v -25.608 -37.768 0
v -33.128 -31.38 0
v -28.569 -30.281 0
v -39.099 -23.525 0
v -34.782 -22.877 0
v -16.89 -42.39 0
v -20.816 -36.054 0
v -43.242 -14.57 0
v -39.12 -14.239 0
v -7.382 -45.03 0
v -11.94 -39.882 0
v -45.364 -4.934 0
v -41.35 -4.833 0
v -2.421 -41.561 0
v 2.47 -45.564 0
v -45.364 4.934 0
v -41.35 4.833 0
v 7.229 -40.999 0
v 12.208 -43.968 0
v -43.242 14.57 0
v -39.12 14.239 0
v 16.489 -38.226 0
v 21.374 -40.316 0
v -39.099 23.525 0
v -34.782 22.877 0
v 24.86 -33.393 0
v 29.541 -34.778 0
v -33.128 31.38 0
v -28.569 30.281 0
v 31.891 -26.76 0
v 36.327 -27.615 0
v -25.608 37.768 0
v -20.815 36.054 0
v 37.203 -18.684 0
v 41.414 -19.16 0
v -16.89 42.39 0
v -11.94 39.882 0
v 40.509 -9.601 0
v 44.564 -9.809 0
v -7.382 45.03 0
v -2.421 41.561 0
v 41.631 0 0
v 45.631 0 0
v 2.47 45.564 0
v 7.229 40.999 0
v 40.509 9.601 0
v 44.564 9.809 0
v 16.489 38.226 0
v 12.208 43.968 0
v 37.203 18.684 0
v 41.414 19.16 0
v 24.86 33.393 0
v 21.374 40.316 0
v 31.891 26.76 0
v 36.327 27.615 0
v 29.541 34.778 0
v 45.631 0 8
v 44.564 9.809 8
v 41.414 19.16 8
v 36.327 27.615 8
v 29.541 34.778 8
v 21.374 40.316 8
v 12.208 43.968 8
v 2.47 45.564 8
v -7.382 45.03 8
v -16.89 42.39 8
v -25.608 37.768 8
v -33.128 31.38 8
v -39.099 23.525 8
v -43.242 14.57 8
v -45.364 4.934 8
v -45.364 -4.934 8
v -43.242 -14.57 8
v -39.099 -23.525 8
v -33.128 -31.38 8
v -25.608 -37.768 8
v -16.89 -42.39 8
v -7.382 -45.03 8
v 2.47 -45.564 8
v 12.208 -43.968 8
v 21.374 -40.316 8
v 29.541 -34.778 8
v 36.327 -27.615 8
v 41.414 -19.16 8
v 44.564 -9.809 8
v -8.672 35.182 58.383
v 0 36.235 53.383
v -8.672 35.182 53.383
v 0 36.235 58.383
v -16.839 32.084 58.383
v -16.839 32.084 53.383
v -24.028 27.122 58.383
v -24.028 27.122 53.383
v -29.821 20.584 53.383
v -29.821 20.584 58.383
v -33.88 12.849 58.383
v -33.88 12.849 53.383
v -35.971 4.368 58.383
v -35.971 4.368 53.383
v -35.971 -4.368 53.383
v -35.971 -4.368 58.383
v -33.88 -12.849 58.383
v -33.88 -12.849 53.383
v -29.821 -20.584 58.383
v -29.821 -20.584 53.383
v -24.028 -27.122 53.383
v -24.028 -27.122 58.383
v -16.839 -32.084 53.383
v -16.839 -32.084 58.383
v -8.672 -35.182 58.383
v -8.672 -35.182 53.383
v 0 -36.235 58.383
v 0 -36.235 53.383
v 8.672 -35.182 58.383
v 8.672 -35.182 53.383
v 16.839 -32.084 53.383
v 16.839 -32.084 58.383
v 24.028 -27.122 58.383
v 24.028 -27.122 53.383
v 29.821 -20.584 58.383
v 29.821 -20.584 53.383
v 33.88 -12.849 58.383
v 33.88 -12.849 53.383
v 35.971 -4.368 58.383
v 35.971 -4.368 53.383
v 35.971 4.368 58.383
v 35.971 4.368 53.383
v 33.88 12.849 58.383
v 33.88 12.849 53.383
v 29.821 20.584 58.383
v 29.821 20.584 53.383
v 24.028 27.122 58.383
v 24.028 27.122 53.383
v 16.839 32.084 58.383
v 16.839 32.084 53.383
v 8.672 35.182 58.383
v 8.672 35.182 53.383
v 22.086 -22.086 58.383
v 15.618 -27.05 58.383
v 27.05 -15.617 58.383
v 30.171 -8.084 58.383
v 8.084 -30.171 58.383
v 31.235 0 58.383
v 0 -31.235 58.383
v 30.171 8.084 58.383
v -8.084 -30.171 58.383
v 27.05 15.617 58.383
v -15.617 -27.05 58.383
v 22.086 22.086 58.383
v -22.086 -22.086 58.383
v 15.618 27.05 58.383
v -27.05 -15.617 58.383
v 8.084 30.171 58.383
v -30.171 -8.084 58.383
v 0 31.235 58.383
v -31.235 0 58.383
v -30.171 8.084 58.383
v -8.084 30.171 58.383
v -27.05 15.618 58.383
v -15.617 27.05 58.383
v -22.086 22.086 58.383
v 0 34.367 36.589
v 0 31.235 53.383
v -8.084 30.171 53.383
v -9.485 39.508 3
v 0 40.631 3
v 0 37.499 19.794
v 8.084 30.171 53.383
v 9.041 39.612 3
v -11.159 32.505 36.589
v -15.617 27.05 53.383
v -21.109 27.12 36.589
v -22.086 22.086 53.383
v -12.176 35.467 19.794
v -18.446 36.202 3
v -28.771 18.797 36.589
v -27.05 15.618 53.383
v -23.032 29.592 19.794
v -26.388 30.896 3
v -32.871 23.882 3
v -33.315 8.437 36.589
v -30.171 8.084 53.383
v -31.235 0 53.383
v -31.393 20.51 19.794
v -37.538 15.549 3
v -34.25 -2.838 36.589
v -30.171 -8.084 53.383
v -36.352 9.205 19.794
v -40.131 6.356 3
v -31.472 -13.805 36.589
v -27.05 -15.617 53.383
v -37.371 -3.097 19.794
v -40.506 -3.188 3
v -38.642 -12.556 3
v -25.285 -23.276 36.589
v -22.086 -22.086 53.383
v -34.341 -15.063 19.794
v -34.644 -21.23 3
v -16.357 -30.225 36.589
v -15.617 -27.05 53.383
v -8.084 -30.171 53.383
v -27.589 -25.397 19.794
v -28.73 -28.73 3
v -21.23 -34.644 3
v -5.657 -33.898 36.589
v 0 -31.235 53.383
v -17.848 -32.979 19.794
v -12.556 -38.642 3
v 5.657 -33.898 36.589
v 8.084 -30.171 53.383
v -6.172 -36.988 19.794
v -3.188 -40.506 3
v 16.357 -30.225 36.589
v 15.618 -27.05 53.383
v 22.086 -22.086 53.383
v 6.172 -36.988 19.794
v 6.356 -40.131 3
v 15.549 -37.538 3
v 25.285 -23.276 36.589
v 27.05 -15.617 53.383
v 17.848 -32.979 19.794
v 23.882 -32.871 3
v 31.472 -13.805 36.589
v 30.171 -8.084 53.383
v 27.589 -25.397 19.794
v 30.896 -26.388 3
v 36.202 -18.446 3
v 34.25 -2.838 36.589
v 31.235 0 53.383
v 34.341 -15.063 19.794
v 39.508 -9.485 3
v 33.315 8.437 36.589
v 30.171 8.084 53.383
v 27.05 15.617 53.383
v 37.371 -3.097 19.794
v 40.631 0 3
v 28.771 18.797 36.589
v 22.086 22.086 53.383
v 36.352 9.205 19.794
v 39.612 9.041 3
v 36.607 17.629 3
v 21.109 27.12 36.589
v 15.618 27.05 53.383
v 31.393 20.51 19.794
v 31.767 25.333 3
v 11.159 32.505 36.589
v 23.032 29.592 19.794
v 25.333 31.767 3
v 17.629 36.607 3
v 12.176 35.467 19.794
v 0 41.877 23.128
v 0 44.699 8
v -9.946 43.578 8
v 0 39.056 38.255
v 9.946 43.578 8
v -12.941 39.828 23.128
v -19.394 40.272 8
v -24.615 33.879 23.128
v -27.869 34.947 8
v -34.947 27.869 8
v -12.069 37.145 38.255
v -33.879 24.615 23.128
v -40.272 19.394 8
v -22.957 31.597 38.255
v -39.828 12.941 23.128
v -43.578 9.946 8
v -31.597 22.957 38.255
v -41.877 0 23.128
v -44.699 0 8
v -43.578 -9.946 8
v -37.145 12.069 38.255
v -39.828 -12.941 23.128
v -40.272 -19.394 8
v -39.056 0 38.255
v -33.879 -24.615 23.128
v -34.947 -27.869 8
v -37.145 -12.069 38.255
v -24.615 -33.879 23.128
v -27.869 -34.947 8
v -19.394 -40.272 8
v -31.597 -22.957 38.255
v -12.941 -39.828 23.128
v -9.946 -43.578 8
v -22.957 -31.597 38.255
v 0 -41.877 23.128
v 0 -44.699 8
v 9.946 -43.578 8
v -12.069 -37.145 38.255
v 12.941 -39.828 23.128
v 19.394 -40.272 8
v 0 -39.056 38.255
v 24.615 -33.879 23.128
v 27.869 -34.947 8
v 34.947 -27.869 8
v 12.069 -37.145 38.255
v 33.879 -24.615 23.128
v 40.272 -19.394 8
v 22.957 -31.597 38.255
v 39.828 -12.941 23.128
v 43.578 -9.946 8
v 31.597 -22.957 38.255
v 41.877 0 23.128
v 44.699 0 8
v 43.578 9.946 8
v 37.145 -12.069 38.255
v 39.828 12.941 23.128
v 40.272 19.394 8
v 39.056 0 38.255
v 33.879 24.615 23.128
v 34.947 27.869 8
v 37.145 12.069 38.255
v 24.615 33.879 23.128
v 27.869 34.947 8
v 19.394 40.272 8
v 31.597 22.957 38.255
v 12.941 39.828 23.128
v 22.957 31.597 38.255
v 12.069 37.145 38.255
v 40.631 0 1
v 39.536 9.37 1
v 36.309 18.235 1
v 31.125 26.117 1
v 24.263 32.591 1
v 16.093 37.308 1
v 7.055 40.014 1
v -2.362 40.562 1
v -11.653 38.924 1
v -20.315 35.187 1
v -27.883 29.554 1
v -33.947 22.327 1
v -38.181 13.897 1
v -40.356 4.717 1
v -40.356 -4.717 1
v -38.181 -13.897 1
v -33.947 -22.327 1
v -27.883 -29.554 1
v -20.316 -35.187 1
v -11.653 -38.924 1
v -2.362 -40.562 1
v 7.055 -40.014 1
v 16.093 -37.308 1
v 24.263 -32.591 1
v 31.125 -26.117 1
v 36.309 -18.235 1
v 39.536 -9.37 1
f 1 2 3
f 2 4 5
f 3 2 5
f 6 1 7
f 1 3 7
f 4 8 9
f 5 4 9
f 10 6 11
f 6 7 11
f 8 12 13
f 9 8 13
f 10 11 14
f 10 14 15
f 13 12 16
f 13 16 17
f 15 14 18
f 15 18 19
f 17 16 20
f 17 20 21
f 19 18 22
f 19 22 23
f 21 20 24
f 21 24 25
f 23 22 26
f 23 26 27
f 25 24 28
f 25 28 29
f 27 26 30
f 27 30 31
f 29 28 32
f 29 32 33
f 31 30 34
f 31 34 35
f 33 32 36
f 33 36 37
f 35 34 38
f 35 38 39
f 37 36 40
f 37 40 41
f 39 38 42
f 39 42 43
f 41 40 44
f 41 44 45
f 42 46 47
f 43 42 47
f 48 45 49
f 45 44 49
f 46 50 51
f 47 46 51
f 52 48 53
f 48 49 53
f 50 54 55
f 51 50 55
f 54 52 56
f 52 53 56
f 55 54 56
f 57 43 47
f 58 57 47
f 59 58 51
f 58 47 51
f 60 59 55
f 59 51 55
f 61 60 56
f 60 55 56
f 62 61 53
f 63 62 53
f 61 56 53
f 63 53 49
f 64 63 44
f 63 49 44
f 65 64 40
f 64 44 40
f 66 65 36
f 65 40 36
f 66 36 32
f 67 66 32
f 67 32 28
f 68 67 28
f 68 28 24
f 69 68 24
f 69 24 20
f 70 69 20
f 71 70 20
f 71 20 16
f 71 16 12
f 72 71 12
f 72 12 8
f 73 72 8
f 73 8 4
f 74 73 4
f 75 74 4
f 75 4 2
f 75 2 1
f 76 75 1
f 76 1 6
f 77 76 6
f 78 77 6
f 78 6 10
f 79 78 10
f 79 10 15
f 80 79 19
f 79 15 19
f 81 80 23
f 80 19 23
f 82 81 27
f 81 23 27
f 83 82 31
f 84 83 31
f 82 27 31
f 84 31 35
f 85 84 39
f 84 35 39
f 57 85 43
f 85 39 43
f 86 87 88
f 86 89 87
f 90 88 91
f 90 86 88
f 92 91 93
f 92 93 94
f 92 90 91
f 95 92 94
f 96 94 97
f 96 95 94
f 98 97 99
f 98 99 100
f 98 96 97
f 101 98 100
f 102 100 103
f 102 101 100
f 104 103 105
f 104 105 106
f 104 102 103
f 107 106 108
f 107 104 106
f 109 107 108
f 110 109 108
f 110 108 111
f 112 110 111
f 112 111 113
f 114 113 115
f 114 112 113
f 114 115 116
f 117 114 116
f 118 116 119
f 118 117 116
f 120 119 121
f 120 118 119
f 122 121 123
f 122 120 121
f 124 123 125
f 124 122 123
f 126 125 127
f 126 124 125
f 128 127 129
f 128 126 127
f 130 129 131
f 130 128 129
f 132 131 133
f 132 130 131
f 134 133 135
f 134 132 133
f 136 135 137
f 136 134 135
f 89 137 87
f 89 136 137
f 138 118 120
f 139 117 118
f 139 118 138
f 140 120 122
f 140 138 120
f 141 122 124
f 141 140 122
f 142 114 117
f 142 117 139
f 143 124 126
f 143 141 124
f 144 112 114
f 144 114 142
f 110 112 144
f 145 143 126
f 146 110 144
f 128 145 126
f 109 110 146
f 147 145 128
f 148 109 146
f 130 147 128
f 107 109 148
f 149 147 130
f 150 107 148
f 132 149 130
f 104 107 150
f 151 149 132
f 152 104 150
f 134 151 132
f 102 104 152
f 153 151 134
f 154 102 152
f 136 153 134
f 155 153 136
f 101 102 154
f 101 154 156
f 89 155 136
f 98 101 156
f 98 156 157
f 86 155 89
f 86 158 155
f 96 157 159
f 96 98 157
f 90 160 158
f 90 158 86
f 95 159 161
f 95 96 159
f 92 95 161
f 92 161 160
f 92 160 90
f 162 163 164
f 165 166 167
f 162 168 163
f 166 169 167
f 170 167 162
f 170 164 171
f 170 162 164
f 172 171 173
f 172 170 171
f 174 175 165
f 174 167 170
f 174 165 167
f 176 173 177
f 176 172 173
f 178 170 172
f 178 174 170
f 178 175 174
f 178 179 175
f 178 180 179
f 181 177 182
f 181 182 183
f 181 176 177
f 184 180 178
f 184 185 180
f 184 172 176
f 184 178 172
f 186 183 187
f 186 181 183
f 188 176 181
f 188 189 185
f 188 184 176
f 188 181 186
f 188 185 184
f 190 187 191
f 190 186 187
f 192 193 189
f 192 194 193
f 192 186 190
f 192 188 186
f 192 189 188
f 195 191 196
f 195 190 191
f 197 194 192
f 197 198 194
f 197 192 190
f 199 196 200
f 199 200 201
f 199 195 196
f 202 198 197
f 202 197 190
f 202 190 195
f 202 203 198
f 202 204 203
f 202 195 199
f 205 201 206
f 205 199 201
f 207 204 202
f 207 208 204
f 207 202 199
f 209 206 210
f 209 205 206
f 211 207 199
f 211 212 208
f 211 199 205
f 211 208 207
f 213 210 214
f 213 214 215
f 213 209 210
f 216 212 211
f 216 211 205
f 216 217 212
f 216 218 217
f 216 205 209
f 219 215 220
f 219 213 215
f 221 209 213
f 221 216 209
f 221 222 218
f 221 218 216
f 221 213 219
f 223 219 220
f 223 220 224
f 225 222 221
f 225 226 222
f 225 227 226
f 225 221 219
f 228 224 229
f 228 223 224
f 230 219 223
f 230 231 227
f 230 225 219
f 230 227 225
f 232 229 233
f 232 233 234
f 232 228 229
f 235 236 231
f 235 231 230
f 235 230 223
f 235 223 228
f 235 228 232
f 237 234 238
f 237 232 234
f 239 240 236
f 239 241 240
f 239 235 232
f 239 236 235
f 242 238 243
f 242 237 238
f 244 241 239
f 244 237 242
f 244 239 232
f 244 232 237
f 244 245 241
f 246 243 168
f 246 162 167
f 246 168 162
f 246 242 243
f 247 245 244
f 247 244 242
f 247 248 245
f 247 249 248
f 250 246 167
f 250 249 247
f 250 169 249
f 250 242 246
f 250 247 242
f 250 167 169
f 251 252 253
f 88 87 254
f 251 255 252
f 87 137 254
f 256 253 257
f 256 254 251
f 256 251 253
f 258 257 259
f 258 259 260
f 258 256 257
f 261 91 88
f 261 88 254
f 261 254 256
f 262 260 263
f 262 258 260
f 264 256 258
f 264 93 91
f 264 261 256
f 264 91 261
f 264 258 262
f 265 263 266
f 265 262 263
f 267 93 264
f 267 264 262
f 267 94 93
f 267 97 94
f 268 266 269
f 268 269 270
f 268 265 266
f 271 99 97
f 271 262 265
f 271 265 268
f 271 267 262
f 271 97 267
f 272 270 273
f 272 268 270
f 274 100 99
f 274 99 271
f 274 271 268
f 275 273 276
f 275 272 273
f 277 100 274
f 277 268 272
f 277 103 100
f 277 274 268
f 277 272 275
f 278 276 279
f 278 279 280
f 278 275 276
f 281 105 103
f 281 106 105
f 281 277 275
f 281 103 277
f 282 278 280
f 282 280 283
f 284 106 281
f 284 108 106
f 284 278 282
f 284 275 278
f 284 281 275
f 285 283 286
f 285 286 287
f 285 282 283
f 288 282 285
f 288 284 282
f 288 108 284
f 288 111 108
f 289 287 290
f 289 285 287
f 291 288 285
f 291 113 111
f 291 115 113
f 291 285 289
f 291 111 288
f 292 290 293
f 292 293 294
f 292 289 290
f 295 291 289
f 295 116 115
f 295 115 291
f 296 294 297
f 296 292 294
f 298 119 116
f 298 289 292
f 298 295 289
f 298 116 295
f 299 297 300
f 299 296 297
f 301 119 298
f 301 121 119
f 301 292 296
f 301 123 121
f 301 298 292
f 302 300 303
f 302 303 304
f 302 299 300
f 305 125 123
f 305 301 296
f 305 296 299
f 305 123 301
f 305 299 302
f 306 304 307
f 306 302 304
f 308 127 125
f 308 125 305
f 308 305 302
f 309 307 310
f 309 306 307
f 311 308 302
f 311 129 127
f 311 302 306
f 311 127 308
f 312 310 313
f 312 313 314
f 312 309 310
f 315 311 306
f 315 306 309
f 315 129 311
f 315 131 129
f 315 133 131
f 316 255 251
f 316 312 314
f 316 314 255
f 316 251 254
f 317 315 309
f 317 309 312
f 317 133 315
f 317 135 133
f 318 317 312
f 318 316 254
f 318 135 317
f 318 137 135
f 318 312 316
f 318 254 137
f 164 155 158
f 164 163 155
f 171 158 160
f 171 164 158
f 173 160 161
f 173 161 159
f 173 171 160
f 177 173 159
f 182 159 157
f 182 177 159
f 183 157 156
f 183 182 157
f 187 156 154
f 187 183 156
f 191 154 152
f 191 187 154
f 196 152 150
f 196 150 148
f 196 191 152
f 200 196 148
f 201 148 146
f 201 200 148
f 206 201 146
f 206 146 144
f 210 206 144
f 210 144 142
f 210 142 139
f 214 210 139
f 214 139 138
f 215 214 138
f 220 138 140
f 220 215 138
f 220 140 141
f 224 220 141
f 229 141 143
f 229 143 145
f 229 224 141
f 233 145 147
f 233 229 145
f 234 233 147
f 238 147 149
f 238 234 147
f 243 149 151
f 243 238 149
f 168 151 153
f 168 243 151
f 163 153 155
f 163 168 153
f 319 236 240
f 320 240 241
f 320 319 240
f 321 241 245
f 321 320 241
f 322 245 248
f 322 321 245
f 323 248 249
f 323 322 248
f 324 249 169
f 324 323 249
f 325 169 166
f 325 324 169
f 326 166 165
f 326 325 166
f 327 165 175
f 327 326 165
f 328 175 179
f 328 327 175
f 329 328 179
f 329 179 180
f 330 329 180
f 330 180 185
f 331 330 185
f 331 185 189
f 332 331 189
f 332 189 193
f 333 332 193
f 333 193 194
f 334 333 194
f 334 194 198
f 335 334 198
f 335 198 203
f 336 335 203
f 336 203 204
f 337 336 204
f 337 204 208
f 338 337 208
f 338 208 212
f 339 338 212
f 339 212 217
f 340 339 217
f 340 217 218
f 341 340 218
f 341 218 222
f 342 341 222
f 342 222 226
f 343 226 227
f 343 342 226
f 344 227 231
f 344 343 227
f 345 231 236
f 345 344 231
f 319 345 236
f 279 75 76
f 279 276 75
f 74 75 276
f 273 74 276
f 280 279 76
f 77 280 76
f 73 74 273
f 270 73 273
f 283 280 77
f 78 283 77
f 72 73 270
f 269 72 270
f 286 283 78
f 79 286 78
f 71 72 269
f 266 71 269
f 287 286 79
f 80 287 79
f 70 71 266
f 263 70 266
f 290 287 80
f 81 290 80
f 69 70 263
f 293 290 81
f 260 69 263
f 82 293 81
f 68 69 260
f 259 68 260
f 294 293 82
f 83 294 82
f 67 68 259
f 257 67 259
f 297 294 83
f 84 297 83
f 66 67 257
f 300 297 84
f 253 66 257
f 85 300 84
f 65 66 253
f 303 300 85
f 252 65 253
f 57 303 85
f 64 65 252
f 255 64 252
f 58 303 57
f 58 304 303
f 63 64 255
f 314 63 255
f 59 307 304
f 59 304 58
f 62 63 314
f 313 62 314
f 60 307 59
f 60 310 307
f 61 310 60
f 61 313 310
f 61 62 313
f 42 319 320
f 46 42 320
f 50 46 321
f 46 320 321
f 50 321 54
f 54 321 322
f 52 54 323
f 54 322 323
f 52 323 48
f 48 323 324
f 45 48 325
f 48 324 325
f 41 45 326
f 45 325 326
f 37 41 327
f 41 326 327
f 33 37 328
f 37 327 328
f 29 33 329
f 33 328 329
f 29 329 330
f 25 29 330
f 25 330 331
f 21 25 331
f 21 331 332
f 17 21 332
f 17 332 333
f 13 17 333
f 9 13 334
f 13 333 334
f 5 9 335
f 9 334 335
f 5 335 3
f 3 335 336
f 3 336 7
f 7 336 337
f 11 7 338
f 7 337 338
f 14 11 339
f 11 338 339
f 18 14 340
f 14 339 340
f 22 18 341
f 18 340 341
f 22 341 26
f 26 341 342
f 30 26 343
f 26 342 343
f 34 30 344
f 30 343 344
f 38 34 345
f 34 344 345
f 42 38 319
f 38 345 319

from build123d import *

# Parameters (mm, degrees)
F0_R     = 45.631
F0_R_2   = 40.631
F1_DEPTH = 8
F4_SIZE  = 1


with BuildPart() as f1:
    # F0 (on Top) → F1 (new body)
    with BuildSketch(Plane.XY):
        Circle(F0_R)
        Circle(F0_R_2, mode=Mode.SUBTRACT)
    extrude(amount=F1_DEPTH)

    # F2 (on Right) → F3 (revolve)
    with BuildSketch(Plane.YZ):
        Polygon((40.631, 3), (45.631, 3), (36.235, 53.383008), (36.235, 58.383008), (31.235, 58.383008), (31.235, 53.383008), align=None)
    revolve(axis=Axis((0, 0, 34.883008), (0, 0, 1)))

    # F4
    f4_edges = [f1.edges().sort_by_distance(p)[0] for p in [
        (-40.631, 0, 0),
    ]]
    chamfer(f4_edges, length=F4_SIZE)


solid = f1.part
